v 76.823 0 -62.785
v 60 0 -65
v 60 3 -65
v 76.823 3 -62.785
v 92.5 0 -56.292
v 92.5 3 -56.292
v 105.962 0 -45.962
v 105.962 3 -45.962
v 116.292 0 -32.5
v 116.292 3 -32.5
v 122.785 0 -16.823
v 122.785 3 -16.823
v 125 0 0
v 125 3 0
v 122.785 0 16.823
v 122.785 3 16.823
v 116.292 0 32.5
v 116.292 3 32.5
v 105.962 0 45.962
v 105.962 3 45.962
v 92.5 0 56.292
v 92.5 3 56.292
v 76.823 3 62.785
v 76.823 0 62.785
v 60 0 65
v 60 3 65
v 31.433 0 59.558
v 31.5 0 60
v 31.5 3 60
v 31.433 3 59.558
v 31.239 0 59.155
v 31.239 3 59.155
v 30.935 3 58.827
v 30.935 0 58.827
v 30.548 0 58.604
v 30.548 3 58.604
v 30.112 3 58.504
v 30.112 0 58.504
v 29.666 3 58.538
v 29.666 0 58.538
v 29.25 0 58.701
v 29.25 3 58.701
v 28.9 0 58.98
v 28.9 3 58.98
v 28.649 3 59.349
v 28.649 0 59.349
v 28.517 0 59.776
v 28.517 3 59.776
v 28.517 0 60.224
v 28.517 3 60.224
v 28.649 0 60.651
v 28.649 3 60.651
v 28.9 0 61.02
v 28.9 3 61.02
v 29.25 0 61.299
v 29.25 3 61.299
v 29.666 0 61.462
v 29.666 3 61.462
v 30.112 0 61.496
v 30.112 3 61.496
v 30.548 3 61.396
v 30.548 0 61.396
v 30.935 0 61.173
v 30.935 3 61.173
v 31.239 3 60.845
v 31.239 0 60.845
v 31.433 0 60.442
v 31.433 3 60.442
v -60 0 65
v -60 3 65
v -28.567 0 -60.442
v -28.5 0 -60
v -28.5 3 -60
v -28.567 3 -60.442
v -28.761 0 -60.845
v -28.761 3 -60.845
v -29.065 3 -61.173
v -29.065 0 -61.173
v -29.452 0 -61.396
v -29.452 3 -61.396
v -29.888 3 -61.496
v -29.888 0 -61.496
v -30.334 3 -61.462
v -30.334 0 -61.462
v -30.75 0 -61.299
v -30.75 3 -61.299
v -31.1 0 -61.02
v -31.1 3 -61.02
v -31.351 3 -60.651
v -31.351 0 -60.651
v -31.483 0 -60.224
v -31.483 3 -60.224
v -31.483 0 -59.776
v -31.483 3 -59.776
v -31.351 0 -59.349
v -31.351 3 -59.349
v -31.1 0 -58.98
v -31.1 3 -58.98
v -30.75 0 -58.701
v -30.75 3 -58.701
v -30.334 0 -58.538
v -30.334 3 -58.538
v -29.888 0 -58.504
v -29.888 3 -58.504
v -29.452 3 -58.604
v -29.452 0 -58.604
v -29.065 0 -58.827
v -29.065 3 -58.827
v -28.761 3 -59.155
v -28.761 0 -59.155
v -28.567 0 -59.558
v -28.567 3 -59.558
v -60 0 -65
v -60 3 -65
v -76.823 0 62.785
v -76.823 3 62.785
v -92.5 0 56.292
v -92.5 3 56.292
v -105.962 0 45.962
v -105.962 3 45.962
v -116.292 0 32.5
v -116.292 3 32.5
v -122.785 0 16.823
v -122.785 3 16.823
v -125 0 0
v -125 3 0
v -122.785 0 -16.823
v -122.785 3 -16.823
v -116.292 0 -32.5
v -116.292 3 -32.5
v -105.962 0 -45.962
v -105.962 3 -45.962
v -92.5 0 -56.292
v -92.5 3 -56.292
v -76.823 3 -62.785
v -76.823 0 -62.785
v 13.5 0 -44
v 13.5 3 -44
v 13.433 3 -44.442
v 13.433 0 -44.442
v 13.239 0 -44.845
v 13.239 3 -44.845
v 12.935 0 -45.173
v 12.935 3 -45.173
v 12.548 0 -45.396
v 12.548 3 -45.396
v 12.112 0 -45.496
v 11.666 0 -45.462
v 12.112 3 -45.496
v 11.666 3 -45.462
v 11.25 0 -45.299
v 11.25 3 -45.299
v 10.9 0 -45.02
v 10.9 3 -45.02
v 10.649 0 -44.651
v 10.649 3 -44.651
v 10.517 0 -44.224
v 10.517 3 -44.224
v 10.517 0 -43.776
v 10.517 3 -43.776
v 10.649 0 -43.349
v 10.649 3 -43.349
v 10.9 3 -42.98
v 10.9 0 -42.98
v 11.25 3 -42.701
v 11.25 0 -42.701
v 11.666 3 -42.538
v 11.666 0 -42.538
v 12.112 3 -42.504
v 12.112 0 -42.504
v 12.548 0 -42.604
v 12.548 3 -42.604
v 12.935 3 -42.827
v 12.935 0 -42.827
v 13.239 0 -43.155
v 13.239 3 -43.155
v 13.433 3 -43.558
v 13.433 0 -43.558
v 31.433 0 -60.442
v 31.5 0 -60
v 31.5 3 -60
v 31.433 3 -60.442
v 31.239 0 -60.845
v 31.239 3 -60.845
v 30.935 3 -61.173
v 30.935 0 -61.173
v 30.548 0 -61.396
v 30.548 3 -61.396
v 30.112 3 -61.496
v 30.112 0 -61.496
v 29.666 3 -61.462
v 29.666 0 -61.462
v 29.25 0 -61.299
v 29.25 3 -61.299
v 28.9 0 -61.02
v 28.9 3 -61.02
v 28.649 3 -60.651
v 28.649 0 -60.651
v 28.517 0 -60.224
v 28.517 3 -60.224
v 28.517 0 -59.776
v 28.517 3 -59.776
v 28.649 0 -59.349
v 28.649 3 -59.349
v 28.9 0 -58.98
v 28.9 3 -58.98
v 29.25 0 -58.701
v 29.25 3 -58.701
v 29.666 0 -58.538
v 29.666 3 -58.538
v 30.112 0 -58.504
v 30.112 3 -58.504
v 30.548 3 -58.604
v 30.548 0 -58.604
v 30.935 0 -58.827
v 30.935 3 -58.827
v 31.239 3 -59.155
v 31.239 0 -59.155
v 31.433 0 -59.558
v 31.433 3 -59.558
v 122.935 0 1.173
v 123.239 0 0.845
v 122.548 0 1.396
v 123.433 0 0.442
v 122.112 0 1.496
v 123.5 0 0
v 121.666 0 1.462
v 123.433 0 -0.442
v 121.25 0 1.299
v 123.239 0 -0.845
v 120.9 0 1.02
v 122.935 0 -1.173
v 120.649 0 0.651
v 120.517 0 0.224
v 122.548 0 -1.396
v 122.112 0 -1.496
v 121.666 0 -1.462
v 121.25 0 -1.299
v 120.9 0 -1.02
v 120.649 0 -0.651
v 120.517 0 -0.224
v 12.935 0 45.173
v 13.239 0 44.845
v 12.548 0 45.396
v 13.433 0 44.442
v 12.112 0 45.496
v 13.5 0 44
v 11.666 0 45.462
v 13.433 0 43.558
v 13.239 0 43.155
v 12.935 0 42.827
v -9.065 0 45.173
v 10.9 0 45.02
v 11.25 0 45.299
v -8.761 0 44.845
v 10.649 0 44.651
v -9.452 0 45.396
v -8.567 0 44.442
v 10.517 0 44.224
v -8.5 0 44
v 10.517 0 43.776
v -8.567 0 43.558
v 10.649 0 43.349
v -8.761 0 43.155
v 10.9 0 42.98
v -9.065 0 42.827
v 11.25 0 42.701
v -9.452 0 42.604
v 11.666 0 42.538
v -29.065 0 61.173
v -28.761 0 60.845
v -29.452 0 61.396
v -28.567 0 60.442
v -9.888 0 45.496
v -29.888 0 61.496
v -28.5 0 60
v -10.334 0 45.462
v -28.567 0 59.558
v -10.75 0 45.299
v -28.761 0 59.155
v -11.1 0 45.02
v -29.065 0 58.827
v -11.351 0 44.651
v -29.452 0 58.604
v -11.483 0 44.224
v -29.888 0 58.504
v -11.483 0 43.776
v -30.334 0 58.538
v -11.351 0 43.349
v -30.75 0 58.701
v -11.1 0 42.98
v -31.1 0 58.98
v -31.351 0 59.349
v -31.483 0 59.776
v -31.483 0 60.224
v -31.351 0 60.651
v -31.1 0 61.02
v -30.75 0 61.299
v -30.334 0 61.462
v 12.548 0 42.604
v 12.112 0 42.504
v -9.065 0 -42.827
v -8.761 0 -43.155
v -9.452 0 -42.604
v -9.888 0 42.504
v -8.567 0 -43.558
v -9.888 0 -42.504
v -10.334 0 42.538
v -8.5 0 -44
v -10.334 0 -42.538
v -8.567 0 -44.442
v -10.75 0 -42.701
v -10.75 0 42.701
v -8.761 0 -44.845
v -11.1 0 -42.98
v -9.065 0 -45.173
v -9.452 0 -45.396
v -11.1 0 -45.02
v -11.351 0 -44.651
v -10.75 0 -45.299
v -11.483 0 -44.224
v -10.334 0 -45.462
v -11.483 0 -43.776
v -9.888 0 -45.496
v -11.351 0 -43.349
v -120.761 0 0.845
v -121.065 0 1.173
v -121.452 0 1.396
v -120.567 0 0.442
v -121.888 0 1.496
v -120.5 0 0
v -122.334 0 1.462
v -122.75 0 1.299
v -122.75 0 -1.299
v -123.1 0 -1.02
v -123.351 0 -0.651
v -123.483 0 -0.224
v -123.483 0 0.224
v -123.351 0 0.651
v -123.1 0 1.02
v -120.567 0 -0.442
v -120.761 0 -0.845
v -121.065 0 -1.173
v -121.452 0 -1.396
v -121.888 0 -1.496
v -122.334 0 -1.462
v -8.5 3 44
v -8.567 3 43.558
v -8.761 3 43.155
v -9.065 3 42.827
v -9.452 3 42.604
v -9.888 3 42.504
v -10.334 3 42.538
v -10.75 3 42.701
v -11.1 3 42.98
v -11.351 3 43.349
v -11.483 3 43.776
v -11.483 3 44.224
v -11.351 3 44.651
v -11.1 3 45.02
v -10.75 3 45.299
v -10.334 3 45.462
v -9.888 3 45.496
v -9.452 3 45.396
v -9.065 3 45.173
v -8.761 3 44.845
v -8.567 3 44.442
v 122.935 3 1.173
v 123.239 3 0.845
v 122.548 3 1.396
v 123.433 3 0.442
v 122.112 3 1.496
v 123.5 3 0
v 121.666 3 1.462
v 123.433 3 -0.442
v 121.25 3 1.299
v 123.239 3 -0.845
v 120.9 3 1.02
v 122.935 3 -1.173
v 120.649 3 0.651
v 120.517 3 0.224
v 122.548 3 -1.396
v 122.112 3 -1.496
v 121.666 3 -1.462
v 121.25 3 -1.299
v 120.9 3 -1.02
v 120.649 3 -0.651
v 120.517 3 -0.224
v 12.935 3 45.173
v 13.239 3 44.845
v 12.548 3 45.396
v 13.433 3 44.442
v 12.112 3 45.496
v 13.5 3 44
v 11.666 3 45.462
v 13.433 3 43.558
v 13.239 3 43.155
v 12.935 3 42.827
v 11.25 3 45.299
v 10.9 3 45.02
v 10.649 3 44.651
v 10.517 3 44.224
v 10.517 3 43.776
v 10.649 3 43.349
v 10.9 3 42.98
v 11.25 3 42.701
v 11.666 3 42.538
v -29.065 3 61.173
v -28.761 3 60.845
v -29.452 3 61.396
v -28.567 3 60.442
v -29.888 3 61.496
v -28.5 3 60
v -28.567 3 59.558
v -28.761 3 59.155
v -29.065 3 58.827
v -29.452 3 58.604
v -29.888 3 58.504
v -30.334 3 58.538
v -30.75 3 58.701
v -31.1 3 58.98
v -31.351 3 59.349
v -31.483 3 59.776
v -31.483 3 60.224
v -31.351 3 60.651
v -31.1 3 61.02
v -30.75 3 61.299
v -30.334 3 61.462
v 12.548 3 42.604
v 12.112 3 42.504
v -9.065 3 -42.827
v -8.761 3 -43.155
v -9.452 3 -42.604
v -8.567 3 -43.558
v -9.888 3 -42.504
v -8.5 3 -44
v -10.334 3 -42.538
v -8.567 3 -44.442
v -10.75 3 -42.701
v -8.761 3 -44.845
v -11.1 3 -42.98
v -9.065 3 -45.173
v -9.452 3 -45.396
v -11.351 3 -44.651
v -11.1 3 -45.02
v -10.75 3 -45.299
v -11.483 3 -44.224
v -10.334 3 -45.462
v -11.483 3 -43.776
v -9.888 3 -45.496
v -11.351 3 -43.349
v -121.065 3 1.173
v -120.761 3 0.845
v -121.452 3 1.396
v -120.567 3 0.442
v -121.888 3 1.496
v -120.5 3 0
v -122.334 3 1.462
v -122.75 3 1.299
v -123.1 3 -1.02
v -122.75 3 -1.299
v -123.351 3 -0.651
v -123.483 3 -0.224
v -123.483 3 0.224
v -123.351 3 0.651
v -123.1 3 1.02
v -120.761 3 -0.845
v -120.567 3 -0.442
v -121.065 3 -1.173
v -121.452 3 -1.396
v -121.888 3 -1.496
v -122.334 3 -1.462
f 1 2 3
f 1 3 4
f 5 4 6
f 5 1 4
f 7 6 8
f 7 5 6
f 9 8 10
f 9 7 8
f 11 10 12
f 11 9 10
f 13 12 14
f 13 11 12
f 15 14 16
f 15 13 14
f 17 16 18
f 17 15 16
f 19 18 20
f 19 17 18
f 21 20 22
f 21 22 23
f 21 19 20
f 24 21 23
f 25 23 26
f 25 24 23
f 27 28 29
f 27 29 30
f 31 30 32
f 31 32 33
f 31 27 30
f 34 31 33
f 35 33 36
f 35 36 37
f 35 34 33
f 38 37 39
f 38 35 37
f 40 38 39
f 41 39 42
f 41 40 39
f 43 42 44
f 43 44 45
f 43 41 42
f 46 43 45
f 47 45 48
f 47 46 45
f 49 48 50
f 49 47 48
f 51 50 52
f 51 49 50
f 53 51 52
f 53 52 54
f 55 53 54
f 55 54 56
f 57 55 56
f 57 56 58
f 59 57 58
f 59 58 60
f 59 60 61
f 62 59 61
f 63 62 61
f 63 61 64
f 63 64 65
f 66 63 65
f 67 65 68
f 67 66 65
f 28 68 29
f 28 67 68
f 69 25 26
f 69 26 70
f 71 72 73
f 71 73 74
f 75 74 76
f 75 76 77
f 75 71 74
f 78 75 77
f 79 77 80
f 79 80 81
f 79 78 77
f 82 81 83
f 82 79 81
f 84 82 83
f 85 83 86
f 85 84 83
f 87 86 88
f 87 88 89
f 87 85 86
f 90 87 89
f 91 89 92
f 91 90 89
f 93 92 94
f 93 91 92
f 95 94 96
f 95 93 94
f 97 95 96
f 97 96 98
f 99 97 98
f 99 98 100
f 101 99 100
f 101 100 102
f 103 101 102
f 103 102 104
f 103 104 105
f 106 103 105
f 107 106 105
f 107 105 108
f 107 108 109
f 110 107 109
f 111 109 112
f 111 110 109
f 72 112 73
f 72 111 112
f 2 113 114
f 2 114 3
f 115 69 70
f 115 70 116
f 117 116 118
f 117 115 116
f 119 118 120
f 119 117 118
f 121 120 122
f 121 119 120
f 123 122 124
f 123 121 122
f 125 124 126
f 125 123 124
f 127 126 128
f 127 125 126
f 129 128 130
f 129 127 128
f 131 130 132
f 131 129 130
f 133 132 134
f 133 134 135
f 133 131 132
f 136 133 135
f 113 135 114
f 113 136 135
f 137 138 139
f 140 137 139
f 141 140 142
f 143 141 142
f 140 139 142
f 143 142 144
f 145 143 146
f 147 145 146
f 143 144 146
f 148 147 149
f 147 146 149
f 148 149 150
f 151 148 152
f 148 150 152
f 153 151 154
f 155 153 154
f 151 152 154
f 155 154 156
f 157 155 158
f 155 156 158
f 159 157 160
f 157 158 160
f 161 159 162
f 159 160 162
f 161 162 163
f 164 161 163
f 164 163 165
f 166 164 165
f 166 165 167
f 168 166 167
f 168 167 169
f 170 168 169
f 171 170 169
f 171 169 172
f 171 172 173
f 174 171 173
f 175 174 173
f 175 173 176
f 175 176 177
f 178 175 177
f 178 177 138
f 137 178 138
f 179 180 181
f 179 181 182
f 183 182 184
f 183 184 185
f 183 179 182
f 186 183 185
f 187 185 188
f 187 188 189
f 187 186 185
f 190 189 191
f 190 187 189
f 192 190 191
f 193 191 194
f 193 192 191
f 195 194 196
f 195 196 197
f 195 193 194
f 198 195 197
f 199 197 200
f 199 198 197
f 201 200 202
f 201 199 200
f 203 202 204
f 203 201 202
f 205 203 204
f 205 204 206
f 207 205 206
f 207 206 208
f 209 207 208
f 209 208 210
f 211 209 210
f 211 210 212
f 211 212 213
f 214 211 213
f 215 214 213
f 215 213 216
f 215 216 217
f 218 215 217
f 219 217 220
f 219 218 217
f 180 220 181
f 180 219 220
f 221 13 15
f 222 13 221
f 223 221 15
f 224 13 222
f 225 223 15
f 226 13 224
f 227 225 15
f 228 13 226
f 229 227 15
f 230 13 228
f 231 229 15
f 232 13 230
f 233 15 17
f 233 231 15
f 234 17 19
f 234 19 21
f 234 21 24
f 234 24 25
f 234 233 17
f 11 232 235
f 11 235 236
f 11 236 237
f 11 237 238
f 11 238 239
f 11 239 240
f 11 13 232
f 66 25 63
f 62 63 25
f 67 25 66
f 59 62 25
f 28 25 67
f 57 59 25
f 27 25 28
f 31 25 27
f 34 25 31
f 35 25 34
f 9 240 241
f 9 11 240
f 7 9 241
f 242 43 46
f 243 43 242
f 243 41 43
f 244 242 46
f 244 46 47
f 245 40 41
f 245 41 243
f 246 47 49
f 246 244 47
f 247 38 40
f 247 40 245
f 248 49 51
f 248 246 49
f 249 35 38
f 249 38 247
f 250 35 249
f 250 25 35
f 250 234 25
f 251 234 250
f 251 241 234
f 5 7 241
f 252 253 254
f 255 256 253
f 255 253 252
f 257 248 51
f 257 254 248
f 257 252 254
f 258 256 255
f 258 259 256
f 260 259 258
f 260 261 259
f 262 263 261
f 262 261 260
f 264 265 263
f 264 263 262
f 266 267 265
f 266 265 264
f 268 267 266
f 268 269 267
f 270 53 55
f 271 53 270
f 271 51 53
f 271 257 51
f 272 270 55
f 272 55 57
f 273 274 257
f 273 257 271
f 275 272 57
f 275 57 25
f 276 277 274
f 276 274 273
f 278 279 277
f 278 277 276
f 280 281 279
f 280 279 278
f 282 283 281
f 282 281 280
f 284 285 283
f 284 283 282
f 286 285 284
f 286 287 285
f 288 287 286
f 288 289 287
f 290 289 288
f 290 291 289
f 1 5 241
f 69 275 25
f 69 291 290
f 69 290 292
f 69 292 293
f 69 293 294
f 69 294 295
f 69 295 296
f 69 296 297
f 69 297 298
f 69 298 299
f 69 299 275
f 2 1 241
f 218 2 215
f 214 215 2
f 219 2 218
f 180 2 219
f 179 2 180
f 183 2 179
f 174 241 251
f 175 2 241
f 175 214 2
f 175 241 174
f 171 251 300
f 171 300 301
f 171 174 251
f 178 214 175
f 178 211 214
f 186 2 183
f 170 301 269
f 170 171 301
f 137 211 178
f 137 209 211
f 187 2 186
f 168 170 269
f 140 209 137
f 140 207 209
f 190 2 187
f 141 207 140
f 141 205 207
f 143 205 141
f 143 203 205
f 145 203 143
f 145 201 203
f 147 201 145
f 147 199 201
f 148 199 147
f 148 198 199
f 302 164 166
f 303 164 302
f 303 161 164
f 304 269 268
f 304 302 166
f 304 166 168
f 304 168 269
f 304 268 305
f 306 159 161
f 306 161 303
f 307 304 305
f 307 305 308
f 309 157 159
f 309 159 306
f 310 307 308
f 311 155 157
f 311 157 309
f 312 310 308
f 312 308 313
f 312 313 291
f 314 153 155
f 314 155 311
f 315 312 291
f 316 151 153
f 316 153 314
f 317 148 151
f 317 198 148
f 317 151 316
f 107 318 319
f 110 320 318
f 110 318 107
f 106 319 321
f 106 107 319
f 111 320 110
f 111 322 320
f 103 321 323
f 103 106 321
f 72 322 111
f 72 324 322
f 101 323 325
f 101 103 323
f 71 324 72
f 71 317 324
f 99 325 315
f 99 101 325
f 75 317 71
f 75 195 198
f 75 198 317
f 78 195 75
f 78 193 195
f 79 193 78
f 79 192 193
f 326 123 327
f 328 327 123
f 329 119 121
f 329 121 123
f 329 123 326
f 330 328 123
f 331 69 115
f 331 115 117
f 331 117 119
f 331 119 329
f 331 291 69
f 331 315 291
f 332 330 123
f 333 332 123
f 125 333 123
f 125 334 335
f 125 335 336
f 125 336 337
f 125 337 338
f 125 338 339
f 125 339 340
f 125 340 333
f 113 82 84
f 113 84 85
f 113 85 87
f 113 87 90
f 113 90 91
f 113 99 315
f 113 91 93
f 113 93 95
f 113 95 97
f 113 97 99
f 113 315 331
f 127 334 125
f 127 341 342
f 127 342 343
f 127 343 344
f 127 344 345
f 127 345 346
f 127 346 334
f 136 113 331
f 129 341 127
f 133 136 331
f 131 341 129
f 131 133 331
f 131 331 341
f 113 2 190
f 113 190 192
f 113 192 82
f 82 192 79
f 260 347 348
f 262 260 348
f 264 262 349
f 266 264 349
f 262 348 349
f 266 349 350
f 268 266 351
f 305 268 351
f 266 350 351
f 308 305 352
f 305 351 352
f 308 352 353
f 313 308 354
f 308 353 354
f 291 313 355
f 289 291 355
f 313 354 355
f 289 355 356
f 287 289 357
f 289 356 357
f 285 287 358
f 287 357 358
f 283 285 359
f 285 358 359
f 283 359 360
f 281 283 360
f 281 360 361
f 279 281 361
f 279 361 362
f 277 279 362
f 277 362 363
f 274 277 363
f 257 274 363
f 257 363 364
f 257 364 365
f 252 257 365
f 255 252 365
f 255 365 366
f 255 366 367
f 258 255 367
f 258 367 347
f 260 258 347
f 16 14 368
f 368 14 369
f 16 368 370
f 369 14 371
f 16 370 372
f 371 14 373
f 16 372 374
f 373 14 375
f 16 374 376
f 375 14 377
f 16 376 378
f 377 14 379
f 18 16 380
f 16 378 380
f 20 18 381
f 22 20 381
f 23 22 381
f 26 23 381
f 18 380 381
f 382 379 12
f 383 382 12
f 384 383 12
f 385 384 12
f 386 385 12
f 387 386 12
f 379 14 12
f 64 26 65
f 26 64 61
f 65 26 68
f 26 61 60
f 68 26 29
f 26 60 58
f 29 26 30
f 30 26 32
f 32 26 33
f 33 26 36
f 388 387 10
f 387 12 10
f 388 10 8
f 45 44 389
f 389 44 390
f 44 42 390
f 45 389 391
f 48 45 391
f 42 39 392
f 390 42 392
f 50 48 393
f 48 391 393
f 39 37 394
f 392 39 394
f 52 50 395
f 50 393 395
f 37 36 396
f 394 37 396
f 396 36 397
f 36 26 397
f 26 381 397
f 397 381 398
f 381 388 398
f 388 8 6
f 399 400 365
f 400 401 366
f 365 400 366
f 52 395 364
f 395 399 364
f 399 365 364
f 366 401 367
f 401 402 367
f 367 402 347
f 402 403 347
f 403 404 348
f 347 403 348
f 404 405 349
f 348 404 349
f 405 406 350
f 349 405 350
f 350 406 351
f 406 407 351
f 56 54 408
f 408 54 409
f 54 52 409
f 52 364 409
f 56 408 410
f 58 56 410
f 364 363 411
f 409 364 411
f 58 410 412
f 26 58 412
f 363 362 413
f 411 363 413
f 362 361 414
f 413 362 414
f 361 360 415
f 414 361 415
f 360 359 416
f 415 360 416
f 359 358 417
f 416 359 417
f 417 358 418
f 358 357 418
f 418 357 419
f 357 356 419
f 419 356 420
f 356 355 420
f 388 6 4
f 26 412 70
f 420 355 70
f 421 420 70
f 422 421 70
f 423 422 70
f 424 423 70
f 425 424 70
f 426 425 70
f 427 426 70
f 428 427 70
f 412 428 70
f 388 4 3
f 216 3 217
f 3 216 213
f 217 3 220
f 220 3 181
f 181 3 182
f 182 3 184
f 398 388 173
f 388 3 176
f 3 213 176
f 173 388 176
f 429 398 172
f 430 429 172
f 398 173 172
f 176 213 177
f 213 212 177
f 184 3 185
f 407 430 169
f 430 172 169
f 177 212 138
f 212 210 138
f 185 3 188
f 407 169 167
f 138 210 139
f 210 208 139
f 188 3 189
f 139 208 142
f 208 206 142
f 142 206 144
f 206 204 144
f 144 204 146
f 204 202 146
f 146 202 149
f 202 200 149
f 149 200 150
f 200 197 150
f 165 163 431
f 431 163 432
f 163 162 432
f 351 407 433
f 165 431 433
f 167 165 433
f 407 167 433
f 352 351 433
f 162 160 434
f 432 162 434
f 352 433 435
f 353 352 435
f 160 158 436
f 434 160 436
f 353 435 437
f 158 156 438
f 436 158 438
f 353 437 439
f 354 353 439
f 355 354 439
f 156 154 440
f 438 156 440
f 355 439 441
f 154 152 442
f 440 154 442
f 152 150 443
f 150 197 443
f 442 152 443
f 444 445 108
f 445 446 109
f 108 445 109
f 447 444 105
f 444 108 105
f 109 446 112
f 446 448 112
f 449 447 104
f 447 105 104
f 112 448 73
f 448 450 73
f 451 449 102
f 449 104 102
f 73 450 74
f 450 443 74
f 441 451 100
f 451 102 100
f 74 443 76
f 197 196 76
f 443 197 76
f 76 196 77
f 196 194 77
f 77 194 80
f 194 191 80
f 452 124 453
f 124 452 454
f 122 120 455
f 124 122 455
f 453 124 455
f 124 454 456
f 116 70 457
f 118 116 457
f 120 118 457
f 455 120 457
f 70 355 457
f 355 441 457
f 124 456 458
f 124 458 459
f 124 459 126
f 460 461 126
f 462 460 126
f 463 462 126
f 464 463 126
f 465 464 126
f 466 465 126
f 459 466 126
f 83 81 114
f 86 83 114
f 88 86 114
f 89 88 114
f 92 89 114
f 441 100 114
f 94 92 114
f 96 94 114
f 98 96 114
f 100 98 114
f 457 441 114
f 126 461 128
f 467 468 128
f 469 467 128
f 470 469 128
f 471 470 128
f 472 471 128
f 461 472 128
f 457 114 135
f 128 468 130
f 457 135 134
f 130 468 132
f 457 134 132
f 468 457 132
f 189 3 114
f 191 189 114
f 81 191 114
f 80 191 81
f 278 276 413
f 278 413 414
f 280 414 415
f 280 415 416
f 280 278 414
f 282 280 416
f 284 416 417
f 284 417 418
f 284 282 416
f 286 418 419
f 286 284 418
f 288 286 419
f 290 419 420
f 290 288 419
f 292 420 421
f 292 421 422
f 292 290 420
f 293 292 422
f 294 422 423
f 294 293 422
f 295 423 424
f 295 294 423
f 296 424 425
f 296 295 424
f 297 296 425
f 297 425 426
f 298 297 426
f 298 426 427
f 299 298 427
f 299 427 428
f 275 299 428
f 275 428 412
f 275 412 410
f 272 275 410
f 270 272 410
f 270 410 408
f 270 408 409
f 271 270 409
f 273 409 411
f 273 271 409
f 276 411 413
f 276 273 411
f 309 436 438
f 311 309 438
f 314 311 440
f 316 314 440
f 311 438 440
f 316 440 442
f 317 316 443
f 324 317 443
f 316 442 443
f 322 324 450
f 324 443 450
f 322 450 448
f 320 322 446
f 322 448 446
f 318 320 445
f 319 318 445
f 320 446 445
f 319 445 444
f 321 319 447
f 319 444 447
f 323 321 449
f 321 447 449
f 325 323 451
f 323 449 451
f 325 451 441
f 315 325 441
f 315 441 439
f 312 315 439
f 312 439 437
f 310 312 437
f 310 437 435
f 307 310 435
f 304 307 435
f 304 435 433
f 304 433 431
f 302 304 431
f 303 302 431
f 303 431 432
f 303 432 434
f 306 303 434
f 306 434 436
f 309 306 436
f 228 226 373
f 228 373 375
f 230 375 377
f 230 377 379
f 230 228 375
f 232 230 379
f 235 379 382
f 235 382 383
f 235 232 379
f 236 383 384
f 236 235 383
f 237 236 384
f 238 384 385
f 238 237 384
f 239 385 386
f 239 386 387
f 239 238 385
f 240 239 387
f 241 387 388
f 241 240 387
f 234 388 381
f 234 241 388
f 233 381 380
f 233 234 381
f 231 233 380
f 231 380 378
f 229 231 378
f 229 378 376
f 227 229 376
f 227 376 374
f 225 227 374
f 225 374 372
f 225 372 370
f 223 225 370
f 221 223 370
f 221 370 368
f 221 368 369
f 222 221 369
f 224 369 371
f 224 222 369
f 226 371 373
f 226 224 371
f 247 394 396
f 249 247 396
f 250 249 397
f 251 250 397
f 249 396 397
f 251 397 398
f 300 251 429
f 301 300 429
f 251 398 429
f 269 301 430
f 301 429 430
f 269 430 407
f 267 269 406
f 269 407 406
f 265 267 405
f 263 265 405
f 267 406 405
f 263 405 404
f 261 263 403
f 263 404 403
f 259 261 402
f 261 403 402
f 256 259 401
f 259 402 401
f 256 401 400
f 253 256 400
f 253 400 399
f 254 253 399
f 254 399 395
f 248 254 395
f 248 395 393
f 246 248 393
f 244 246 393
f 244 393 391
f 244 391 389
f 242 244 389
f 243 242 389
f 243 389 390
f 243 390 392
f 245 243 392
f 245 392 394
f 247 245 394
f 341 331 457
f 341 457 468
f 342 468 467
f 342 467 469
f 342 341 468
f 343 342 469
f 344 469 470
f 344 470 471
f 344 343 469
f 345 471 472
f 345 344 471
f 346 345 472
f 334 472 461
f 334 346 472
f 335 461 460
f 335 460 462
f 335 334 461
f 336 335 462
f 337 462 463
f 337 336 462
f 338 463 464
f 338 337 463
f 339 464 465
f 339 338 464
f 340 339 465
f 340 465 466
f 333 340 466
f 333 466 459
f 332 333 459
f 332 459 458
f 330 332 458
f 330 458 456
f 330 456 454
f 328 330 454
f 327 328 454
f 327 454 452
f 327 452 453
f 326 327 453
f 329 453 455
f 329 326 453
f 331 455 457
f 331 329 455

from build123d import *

# Parameters (mm, degrees)
SKETCH_1_R          = 1.5
EXTRUDE_2_DEPTH     = 3
SKETCH_2_R          = 1.5
CUT_EXTRUDE_1_DEPTH = 10


with BuildPart() as part:
    # 草图1 → 凸台-拉伸2 (new body)
    with BuildSketch(Plane(origin=(0, 0, 0), x_dir=(1, 0, 0), z_dir=(0, 1, 0))):
        with BuildLine():
            Line((-60, 65), (60, 65))
            ThreePointArc((60, 65), (125, 0), (60, -65))
            Line((60, -65), (-60, -65))
            ThreePointArc((-60, -65), (-125, 0), (-60, 65))
        make_face()
        with Locations((-122, 0)):
            Circle(SKETCH_1_R, mode=Mode.SUBTRACT)
        with Locations((122, 0)):
            Circle(SKETCH_1_R, mode=Mode.SUBTRACT)
        with Locations((-30, 60)):
            Circle(SKETCH_1_R, mode=Mode.SUBTRACT)
        with Locations((30, 60)):
            Circle(SKETCH_1_R, mode=Mode.SUBTRACT)
        with Locations((30, -60)):
            Circle(SKETCH_1_R, mode=Mode.SUBTRACT)
        with Locations((-30, -60)):
            Circle(SKETCH_1_R, mode=Mode.SUBTRACT)
    extrude(amount=EXTRUDE_2_DEPTH)

    # 草图2 → 切除-拉伸1 (cut)
    with BuildSketch(Plane(origin=(0, 3, 0), x_dir=(1, 0, 0), z_dir=(0, 1, 0))):
        with Locations((-10, 44)):
            Circle(SKETCH_2_R)
        with Locations((12, 44)):
            Circle(SKETCH_2_R)
        with Locations((-10, -44)):
            Circle(SKETCH_2_R)
        with Locations((12, -44)):
            Circle(SKETCH_2_R)
    extrude(amount=-CUT_EXTRUDE_1_DEPTH, mode=Mode.SUBTRACT)


solid = part.part
